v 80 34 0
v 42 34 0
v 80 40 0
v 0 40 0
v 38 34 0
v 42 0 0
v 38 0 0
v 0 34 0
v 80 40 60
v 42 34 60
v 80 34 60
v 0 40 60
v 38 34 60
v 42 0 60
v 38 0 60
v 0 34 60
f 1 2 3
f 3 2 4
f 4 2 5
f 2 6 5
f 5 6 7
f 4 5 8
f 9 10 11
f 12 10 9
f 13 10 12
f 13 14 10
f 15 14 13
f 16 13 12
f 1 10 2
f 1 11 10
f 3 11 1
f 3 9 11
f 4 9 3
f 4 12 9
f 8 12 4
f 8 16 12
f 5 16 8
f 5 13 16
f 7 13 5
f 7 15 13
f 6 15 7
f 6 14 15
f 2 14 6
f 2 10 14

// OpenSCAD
$fn = 32;

// ----------------------------------------------------------------------
// Structural section: tee 80 x 40 mm
// ----------------------------------------------------------------------

// --- parameters (mm) ---
sec_w = 80;               // tee width, X
sec_h = 40;               // tee height, Y
flange_t = 6;             // top flange thickness
web_t = 4;                // web thickness
plate_t = 60;             // cut length, Z (extrusion height)
fit_tol = 0.1;            // declared fit tolerance (prompt contract)
free_tol = 0.5;           // declared free tolerance (prompt contract)

profile = [[38, 0], [42, 0], [42, 34], [80, 34], [80, 40], [0, 40], [0, 34], [38, 34]];  // primary outline, 8 points, counter clockwise

// --- the one profile operation ---
linear_extrude(height = plate_t) polygon(points = profile);
